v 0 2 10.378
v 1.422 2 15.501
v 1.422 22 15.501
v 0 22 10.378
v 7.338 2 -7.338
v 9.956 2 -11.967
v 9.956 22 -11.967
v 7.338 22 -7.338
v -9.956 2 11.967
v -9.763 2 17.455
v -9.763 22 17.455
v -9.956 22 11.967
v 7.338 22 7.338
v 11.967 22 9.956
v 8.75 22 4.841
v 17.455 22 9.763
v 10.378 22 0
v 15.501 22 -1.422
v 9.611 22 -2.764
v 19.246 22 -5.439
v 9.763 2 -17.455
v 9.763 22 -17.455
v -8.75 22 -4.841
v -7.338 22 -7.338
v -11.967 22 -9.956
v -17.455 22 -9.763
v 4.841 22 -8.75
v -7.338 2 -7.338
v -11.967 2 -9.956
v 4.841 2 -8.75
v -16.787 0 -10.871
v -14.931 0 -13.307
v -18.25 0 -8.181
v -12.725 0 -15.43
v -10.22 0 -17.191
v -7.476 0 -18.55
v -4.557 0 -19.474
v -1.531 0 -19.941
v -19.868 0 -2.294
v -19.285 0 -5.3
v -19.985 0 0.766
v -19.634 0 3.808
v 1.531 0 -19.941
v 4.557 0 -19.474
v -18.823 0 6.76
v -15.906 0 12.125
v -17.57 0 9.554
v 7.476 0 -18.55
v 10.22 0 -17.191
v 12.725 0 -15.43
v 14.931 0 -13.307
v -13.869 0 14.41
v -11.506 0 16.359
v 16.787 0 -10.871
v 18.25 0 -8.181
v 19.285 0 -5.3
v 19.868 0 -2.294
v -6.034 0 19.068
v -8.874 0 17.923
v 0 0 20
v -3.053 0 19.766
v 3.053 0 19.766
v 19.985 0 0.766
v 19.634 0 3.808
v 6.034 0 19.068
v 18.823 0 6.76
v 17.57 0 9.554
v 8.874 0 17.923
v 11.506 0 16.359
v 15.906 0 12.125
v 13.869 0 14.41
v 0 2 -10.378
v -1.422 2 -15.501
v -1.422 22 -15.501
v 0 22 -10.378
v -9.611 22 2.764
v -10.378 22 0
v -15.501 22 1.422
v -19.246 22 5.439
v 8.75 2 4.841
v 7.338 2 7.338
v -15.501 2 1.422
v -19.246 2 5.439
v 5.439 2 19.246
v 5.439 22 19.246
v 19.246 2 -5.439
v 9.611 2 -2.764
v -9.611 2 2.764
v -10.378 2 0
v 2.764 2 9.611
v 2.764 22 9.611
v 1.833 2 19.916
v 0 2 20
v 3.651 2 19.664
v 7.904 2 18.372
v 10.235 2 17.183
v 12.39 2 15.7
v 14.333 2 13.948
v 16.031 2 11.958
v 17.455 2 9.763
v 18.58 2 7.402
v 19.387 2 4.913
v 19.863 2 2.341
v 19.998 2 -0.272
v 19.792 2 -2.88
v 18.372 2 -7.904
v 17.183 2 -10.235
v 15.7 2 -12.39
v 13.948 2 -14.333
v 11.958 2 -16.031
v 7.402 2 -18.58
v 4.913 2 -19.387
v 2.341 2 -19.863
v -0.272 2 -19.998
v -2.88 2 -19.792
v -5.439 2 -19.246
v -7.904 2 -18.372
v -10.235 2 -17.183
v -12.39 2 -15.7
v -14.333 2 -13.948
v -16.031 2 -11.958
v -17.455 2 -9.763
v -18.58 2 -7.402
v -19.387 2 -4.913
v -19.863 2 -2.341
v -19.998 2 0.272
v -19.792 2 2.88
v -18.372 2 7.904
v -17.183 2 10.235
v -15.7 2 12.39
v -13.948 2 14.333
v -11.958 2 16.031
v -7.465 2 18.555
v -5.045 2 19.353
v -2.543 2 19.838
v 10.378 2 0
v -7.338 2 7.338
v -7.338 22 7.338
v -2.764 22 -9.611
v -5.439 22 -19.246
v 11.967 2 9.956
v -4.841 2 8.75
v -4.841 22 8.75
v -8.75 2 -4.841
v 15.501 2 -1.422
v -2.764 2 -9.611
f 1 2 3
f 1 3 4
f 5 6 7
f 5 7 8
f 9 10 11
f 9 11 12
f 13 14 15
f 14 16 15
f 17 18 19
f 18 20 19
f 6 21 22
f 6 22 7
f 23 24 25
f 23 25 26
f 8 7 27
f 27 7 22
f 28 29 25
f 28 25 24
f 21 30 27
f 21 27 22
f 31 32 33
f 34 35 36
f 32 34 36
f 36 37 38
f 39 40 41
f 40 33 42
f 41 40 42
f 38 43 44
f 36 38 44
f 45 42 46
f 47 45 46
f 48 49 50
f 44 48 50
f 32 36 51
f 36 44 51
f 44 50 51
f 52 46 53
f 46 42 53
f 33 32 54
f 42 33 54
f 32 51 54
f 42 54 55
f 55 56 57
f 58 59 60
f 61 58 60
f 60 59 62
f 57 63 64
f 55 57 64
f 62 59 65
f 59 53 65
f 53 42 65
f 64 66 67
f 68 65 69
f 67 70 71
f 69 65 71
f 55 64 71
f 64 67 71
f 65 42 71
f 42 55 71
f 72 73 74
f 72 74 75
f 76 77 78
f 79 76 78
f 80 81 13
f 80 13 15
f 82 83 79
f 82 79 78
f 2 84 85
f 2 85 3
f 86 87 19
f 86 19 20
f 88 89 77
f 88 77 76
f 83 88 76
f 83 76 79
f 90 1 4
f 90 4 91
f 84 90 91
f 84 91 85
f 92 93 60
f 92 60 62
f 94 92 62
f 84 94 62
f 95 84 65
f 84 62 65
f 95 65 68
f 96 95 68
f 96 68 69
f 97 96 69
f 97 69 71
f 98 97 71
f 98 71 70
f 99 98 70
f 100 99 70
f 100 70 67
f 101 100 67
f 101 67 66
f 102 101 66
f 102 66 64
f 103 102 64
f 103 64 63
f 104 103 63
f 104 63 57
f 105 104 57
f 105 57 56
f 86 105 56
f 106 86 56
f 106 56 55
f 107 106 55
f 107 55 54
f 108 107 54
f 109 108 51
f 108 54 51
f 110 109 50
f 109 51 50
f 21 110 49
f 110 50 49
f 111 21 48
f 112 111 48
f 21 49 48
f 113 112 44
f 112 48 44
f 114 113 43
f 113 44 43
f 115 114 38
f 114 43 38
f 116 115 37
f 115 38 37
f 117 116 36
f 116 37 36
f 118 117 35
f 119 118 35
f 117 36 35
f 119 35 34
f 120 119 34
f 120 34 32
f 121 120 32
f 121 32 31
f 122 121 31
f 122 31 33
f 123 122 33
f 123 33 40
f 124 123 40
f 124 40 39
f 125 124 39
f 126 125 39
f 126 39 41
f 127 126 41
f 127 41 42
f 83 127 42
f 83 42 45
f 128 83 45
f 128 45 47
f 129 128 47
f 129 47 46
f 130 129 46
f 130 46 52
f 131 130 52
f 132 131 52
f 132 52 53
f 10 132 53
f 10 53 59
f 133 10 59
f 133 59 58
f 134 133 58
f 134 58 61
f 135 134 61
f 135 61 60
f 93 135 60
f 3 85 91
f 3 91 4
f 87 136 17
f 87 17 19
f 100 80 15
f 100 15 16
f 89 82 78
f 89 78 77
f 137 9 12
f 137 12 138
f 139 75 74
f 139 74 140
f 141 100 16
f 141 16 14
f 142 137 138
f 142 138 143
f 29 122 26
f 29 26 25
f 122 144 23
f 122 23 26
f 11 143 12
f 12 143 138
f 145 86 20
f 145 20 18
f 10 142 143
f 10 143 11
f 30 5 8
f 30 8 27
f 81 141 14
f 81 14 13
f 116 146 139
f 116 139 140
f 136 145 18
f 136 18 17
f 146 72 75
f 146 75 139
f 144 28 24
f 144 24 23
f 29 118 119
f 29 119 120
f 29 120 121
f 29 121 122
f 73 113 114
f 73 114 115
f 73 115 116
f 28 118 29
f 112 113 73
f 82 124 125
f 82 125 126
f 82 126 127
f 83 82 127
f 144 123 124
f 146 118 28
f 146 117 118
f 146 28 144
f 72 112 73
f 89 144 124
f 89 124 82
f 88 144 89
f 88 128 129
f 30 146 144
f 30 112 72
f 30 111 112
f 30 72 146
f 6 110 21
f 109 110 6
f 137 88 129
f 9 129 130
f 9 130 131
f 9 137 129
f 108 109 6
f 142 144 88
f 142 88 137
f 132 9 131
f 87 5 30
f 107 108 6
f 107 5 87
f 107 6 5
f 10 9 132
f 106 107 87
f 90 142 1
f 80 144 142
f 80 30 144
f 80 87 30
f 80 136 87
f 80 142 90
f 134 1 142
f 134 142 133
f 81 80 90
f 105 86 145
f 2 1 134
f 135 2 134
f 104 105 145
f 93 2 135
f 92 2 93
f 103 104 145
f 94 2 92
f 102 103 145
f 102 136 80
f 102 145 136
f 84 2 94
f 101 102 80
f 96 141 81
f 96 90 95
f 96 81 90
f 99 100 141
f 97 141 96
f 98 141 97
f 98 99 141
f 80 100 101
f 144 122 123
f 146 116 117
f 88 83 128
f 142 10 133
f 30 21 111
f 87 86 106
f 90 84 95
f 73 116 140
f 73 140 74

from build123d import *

# Parameters (mm, degrees)
SKETCH_1_R      = 20
EXTRUDE_1_DEPTH = 2
EXTRUDE_2_DEPTH = 20


with BuildPart() as part:
    # 草图1 → 凸台-拉伸1 (new body)
    with BuildSketch(Plane(origin=(0, 0, 0), x_dir=(1, 0, 0), z_dir=(0, 1, 0))):
        with Locations(Location((0, 0, 0), (0, 0, 270))):
            Circle(SKETCH_1_R)
    extrude(amount=EXTRUDE_1_DEPTH)

    # 草图2 → 凸台-拉伸2 (add)
    with BuildSketch(Plane(origin=(0, 2, 0), x_dir=(1, 0, 0), z_dir=(0, 1, 0))):
        Polygon((1.422012769, -15.50129709), (0, -10.377789627), (2.764347063, -9.610554125), (5.438718845, -19.246307109), align=None)
        Polygon((-9.955557418, -11.966587161), (-7.338205419, -7.338205419), (-4.840999439, -8.750376546), (-9.763439294, -17.454949245), align=None)
        Polygon((-15.50129709, -1.422012769), (-10.377789627, 0), (-9.610554125, -2.764347063), (-19.246307109, -5.438718845), align=None)
        Polygon((-11.966587161, 9.955557418), (-7.338205419, 7.338205419), (-8.750376546, 4.840999439), (-17.454949245, 9.763439294), align=None)
        Polygon((-1.422012769, 15.50129709), (0, 10.377789627), (-2.764347063, 9.610554125), (-5.438718845, 19.246307109), align=None)
        Polygon((9.955557418, 11.966587161), (7.338205419, 7.338205419), (4.840999439, 8.750376546), (9.763439294, 17.454949245), align=None)
        Polygon((15.50129709, 1.422012769), (10.377789627, 0), (9.610554125, 2.764347063), (19.246307109, 5.438718845), align=None)
        Polygon((11.966587161, -9.955557418), (7.338205419, -7.338205419), (8.750376546, -4.840999439), (17.454949245, -9.763439294), align=None)
    extrude(amount=EXTRUDE_2_DEPTH)


solid = part.part
